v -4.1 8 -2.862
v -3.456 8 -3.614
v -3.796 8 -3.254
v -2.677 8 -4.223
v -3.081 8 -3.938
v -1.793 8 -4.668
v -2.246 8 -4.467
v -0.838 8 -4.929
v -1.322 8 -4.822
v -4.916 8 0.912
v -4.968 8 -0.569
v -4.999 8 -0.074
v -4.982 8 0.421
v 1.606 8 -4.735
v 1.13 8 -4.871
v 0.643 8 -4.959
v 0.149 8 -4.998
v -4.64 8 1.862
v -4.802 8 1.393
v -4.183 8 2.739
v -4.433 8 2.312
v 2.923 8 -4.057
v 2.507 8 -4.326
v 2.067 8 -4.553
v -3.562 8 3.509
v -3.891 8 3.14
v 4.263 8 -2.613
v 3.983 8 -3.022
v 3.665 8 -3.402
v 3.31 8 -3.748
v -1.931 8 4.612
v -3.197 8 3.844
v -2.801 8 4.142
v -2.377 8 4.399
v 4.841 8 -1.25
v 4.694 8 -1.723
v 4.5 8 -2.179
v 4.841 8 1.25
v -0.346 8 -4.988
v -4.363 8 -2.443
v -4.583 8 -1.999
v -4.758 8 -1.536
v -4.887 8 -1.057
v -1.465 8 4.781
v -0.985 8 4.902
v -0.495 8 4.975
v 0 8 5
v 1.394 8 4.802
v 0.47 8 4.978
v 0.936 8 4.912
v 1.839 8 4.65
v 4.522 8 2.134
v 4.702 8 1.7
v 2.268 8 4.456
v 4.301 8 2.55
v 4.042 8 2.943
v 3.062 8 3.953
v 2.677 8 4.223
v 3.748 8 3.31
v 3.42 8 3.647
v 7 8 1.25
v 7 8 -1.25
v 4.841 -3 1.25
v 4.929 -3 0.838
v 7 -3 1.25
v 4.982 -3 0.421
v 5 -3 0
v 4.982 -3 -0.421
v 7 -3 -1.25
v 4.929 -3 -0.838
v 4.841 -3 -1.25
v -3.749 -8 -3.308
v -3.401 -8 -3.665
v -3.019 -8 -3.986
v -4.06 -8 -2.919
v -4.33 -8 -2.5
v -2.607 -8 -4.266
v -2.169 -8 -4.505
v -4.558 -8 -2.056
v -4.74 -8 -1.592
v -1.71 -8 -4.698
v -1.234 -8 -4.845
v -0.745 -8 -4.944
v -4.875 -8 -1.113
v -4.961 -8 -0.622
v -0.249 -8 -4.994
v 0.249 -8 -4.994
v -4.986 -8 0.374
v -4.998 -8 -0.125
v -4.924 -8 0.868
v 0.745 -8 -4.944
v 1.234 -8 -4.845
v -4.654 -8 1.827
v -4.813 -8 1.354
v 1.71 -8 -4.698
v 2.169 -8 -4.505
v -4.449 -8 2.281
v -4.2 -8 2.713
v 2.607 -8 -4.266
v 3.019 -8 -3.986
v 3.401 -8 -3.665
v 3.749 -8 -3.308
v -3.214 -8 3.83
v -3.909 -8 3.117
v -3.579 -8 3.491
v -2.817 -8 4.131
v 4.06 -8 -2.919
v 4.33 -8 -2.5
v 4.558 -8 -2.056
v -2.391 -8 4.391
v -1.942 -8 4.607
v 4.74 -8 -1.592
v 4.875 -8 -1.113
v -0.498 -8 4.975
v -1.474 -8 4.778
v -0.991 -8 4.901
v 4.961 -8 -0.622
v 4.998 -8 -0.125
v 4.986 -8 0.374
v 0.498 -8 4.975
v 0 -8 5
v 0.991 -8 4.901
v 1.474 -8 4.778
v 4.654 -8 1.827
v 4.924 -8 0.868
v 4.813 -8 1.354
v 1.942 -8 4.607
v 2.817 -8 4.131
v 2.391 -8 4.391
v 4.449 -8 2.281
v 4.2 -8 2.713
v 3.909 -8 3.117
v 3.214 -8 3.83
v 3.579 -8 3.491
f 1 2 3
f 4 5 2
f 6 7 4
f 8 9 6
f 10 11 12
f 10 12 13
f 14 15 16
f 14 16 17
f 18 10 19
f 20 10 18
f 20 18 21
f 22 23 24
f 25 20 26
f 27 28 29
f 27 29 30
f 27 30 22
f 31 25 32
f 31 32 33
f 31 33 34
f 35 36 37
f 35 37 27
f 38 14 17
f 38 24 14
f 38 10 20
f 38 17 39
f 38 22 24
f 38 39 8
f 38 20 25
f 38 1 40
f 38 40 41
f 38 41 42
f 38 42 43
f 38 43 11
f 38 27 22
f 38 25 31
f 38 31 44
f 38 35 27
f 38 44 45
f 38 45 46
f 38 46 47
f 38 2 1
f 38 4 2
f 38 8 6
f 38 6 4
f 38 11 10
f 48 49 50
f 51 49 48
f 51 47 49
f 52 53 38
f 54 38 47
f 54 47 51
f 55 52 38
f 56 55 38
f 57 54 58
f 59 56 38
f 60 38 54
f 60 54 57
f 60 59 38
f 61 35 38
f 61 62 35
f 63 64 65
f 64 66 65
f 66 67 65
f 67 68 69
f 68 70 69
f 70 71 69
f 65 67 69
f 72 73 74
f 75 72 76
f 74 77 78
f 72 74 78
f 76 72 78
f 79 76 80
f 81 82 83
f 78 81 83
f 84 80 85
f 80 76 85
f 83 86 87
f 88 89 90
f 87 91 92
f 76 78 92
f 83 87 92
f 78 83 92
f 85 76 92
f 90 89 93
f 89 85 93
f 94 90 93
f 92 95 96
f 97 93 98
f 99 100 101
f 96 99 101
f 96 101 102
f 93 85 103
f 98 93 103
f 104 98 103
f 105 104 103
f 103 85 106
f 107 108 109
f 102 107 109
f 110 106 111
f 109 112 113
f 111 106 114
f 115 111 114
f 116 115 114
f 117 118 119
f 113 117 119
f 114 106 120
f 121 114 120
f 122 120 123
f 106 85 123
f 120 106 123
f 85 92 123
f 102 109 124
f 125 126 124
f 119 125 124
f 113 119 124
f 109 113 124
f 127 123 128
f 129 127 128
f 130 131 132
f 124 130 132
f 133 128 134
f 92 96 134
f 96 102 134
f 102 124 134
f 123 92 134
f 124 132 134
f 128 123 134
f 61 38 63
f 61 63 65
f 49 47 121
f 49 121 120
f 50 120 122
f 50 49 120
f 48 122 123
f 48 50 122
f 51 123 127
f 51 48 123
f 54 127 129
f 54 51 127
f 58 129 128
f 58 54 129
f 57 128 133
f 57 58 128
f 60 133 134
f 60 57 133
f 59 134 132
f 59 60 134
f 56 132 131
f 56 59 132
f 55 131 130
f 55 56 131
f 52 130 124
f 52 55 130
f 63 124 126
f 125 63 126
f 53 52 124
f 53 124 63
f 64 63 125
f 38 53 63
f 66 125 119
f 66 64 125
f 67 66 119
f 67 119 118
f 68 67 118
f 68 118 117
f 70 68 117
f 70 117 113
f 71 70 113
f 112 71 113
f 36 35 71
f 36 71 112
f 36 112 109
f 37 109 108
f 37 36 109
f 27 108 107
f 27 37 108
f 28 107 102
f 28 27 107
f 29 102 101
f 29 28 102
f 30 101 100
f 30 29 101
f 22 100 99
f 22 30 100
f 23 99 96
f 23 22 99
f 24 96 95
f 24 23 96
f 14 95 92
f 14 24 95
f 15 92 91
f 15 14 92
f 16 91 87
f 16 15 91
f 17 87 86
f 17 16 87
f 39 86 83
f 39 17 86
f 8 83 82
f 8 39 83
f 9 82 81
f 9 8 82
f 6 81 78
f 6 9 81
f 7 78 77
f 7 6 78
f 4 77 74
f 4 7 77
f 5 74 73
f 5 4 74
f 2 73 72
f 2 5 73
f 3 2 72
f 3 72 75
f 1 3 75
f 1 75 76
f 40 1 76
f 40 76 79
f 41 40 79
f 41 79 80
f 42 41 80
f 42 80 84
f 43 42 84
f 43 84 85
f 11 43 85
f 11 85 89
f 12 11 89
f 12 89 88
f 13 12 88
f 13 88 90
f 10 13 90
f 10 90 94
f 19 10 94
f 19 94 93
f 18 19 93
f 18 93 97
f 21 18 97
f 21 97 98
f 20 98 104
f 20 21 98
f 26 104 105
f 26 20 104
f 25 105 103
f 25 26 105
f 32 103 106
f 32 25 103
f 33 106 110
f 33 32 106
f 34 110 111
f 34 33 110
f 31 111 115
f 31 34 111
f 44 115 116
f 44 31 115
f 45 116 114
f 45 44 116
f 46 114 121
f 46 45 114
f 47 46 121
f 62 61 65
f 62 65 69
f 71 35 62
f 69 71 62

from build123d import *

# Parameters (mm, degrees)
SKETCH1_R           = 5
BOSS_EXTRUDE1_DEPTH = 8
SKETCH2_W           = 7
SKETCH2_H           = 2.5
BOSS_EXTRUDE2_DEPTH = 11


with BuildPart() as part:
    # Sketch1 → Boss-Extrude1 (new, symmetric)
    with BuildSketch(Plane(origin=(0, 0, 0), x_dir=(1, 0, 0), z_dir=(0, 1, 0))):
        with Locations(Location((0, 0, 0), (0, 0, 270))):
            Circle(SKETCH1_R)
    extrude(amount=BOSS_EXTRUDE1_DEPTH, both=True)

    # Sketch2 → Boss-Extrude2 (add)
    with BuildSketch(Plane(origin=(0, 8, 0), x_dir=(1, 0, 0), z_dir=(0, 1, 0))):
        with Locations((3.5, 0)):
            Rectangle(SKETCH2_W, SKETCH2_H)
    extrude(amount=-BOSS_EXTRUDE2_DEPTH)


solid = part.part
